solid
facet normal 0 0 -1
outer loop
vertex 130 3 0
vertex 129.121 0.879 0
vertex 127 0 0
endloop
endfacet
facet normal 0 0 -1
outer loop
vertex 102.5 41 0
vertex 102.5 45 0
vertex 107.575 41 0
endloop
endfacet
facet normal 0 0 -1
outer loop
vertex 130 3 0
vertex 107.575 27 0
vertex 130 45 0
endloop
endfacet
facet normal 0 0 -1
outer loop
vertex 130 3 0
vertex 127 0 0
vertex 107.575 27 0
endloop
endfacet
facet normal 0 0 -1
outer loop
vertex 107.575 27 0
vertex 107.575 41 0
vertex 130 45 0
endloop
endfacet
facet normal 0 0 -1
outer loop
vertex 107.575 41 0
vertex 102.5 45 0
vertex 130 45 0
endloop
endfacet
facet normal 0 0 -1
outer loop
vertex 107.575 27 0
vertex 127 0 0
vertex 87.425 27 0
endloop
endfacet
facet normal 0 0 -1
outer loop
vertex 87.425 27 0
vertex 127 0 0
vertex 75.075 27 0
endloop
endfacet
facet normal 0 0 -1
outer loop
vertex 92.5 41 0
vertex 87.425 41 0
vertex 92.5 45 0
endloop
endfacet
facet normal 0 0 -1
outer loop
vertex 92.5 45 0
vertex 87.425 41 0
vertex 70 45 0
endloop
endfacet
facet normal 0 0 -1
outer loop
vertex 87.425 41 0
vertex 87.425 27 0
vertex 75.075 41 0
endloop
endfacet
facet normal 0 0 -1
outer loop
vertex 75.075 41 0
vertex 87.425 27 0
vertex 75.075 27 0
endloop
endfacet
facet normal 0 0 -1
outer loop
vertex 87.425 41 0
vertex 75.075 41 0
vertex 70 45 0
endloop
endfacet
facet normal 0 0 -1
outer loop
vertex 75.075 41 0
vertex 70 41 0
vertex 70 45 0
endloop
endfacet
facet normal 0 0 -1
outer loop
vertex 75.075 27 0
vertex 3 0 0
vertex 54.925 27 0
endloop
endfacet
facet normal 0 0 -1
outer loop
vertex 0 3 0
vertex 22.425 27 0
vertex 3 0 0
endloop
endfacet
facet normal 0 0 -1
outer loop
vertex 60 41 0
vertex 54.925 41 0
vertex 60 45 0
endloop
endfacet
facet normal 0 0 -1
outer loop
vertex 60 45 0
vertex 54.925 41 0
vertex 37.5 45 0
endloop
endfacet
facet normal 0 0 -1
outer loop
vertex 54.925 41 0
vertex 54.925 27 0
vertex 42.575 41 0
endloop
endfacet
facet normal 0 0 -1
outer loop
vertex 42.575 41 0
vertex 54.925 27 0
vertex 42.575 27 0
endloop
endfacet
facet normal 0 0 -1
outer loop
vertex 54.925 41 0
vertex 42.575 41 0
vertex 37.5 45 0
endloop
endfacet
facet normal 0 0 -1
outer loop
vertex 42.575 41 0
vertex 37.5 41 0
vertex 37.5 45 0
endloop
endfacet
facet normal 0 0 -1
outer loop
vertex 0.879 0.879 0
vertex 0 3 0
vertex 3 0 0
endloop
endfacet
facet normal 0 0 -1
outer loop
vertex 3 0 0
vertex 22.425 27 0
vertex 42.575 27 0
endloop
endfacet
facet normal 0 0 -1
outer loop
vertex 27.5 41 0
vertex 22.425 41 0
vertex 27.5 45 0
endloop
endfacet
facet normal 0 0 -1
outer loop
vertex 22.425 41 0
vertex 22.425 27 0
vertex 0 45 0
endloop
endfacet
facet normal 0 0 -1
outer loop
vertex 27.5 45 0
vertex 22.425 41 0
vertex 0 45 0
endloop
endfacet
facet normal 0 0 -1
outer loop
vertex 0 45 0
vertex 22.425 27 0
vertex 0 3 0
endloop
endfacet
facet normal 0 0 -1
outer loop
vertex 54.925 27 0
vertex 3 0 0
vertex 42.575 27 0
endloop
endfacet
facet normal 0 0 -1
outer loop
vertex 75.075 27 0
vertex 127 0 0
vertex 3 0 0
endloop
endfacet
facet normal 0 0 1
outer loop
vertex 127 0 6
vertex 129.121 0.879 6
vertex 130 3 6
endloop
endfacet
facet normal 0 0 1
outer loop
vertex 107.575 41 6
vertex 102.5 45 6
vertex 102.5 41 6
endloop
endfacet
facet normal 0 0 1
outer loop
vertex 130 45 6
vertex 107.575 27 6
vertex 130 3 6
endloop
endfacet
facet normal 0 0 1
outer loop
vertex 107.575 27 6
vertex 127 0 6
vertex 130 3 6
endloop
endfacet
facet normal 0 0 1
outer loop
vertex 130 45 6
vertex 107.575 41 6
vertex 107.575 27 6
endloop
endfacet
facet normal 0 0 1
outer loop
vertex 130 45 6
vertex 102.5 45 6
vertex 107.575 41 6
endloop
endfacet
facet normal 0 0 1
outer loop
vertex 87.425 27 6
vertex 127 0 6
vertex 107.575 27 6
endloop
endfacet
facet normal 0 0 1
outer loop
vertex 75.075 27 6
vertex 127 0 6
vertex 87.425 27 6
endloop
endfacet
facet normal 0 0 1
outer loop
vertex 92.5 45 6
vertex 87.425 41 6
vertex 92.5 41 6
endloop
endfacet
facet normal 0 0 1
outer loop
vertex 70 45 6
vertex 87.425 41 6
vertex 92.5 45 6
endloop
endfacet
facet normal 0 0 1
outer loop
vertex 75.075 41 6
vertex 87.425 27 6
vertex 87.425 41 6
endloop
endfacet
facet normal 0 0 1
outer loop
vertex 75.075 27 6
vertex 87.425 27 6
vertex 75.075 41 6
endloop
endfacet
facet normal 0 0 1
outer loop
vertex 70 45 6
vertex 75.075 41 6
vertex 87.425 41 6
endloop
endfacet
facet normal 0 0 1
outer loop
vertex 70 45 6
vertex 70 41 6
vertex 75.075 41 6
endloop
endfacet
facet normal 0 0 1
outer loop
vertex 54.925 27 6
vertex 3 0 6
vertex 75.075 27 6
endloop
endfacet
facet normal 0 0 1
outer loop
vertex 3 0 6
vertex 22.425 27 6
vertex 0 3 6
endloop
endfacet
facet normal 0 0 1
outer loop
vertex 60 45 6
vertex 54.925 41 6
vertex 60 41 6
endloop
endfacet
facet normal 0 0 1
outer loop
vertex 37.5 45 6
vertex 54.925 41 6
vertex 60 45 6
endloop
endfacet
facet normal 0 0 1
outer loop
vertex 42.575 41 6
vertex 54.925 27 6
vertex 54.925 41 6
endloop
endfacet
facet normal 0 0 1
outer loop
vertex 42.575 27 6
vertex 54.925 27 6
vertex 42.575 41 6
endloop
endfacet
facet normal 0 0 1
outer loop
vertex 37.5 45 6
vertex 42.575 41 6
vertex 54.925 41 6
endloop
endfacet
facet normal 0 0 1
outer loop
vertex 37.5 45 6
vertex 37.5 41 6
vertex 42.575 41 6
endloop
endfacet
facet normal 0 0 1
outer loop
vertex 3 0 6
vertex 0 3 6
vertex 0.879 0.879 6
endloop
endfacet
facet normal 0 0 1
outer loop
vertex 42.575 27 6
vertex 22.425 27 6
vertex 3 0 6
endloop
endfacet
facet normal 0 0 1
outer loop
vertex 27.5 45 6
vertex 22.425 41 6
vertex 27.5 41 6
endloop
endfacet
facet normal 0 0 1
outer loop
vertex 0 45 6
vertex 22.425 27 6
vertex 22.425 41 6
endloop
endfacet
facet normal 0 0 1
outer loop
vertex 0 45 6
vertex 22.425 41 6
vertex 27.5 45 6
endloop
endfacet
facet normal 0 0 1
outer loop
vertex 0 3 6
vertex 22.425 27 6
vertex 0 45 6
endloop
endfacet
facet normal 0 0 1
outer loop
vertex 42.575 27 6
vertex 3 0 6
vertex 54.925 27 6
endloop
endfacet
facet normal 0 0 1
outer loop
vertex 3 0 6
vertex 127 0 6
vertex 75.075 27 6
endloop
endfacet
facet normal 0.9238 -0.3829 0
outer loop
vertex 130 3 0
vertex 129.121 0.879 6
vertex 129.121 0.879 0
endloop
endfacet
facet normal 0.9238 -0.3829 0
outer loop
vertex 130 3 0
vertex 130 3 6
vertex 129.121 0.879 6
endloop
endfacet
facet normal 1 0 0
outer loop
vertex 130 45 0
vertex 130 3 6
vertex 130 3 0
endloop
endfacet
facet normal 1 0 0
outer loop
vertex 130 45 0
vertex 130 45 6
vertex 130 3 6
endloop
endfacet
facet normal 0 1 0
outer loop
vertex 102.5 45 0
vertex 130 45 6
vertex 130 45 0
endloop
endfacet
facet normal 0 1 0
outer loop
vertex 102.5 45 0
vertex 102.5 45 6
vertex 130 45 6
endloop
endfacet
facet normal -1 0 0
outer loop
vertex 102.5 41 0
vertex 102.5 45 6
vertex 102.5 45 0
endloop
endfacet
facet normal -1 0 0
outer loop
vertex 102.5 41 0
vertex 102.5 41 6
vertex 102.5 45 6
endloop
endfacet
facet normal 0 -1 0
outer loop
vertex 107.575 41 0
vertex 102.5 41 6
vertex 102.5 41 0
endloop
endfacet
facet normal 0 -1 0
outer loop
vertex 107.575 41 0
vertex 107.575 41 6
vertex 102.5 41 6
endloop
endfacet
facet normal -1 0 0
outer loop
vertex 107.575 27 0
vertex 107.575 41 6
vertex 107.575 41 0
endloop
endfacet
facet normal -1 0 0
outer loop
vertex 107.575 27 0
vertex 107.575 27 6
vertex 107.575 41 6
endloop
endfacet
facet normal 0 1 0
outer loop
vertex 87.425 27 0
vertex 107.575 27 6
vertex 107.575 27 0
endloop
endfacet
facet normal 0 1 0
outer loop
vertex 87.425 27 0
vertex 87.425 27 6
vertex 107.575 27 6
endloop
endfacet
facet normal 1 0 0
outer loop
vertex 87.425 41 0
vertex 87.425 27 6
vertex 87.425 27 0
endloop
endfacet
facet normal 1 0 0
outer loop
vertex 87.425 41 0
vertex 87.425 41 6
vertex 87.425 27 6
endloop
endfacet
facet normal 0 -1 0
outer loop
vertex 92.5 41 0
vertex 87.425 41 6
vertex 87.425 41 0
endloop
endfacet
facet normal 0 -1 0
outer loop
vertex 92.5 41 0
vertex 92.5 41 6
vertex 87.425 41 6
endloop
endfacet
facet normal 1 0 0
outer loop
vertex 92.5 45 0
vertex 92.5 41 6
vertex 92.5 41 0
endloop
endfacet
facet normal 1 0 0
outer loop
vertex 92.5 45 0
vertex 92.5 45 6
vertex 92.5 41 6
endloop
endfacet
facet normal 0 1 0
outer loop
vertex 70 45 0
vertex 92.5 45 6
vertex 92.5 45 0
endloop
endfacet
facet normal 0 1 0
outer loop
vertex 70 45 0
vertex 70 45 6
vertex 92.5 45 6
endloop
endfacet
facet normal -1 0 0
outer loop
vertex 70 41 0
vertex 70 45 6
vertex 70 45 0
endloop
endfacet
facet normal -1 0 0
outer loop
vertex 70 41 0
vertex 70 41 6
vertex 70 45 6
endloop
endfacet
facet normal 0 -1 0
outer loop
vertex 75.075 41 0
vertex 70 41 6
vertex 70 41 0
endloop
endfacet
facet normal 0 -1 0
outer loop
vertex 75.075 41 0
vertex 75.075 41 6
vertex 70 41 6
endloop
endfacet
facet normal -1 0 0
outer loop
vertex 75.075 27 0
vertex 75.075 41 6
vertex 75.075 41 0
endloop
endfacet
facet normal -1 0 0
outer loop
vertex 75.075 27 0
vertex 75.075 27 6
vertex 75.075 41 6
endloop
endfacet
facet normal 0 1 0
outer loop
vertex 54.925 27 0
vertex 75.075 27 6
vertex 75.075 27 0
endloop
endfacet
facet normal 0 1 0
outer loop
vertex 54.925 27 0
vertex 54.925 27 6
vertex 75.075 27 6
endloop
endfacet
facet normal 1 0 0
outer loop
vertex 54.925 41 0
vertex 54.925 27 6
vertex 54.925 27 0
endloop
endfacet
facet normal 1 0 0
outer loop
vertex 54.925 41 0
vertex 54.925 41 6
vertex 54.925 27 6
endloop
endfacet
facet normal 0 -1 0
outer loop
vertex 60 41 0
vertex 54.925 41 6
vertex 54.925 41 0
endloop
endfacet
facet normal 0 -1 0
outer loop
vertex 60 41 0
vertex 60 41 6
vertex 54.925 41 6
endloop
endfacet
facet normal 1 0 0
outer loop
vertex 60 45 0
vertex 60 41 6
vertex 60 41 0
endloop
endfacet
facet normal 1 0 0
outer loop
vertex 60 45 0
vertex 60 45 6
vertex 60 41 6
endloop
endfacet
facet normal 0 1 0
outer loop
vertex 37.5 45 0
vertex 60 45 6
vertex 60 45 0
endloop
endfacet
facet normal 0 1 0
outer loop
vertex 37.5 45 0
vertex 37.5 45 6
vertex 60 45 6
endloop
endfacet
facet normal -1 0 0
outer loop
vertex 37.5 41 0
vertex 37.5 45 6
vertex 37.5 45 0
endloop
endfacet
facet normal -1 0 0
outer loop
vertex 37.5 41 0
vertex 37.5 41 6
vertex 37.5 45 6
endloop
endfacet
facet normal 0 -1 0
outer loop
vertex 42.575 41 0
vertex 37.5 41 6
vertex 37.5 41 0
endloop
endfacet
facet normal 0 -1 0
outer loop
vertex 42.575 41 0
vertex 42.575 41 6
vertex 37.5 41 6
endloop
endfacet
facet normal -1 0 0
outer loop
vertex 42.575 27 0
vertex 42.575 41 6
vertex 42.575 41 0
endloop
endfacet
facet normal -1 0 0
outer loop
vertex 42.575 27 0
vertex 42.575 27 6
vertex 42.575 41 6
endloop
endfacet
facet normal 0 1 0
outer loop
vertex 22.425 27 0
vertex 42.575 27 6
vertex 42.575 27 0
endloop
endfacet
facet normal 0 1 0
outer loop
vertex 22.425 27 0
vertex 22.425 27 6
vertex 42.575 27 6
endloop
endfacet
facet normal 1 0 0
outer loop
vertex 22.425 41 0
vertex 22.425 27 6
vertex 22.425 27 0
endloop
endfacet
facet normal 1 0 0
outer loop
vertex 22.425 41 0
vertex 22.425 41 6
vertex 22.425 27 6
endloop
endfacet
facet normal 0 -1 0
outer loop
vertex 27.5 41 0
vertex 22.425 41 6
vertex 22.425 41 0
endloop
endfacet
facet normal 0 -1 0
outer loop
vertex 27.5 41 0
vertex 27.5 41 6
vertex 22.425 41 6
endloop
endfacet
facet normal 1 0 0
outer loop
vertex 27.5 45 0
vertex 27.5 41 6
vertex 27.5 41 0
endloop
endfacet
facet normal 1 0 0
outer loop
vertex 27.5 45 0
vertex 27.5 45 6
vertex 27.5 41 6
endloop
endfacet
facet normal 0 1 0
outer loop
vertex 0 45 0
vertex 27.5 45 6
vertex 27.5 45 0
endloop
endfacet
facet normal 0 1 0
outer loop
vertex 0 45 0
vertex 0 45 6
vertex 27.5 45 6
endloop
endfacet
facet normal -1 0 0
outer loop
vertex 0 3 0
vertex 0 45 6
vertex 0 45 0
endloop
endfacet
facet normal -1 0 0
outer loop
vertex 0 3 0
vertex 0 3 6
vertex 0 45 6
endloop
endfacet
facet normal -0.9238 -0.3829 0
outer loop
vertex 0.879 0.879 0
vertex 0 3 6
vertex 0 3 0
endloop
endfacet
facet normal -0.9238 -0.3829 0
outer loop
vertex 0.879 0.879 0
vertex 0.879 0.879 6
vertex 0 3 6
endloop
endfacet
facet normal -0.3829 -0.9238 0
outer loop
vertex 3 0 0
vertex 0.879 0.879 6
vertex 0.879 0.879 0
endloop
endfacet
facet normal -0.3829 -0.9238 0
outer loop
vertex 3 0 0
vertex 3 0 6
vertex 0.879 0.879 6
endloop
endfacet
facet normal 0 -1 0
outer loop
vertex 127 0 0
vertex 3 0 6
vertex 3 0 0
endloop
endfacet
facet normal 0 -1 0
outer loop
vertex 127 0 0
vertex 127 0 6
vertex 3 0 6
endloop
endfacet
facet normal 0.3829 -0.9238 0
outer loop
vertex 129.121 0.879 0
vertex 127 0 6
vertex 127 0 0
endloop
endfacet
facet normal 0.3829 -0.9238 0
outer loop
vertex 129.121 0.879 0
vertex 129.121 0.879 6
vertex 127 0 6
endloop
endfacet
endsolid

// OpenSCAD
$fn = 32;

// ----------------------------------------------------------------------
// Window plate: 130 x 45 mm, 3 open windows
// ----------------------------------------------------------------------

// --- parameters (mm) ---
profile_height = 6;       // extrusion height
profile_points = 32;      // points of the closed outline

profile = [[0, 3], [0.879, 0.879], [3, 0], [127, 0], [129.121, 0.879], [130, 3], [130, 45], [102.5, 45], [102.5, 41], [107.575, 41], [107.575, 27], [87.425, 27], [87.425, 41], [92.5, 41], [92.5, 45], [70, 45], [70, 41], [75.075, 41], [75.075, 27], [54.925, 27], [54.925, 41], [60, 41], [60, 45], [37.5, 45], [37.5, 41], [42.575, 41], [42.575, 27], [22.425, 27], [22.425, 41], [27.5, 41], [27.5, 45], [0, 45]];  // single closed polygon, 32 points, counter clockwise

// --- the one profile operation ---
linear_extrude(height = profile_height) polygon(points = profile);
